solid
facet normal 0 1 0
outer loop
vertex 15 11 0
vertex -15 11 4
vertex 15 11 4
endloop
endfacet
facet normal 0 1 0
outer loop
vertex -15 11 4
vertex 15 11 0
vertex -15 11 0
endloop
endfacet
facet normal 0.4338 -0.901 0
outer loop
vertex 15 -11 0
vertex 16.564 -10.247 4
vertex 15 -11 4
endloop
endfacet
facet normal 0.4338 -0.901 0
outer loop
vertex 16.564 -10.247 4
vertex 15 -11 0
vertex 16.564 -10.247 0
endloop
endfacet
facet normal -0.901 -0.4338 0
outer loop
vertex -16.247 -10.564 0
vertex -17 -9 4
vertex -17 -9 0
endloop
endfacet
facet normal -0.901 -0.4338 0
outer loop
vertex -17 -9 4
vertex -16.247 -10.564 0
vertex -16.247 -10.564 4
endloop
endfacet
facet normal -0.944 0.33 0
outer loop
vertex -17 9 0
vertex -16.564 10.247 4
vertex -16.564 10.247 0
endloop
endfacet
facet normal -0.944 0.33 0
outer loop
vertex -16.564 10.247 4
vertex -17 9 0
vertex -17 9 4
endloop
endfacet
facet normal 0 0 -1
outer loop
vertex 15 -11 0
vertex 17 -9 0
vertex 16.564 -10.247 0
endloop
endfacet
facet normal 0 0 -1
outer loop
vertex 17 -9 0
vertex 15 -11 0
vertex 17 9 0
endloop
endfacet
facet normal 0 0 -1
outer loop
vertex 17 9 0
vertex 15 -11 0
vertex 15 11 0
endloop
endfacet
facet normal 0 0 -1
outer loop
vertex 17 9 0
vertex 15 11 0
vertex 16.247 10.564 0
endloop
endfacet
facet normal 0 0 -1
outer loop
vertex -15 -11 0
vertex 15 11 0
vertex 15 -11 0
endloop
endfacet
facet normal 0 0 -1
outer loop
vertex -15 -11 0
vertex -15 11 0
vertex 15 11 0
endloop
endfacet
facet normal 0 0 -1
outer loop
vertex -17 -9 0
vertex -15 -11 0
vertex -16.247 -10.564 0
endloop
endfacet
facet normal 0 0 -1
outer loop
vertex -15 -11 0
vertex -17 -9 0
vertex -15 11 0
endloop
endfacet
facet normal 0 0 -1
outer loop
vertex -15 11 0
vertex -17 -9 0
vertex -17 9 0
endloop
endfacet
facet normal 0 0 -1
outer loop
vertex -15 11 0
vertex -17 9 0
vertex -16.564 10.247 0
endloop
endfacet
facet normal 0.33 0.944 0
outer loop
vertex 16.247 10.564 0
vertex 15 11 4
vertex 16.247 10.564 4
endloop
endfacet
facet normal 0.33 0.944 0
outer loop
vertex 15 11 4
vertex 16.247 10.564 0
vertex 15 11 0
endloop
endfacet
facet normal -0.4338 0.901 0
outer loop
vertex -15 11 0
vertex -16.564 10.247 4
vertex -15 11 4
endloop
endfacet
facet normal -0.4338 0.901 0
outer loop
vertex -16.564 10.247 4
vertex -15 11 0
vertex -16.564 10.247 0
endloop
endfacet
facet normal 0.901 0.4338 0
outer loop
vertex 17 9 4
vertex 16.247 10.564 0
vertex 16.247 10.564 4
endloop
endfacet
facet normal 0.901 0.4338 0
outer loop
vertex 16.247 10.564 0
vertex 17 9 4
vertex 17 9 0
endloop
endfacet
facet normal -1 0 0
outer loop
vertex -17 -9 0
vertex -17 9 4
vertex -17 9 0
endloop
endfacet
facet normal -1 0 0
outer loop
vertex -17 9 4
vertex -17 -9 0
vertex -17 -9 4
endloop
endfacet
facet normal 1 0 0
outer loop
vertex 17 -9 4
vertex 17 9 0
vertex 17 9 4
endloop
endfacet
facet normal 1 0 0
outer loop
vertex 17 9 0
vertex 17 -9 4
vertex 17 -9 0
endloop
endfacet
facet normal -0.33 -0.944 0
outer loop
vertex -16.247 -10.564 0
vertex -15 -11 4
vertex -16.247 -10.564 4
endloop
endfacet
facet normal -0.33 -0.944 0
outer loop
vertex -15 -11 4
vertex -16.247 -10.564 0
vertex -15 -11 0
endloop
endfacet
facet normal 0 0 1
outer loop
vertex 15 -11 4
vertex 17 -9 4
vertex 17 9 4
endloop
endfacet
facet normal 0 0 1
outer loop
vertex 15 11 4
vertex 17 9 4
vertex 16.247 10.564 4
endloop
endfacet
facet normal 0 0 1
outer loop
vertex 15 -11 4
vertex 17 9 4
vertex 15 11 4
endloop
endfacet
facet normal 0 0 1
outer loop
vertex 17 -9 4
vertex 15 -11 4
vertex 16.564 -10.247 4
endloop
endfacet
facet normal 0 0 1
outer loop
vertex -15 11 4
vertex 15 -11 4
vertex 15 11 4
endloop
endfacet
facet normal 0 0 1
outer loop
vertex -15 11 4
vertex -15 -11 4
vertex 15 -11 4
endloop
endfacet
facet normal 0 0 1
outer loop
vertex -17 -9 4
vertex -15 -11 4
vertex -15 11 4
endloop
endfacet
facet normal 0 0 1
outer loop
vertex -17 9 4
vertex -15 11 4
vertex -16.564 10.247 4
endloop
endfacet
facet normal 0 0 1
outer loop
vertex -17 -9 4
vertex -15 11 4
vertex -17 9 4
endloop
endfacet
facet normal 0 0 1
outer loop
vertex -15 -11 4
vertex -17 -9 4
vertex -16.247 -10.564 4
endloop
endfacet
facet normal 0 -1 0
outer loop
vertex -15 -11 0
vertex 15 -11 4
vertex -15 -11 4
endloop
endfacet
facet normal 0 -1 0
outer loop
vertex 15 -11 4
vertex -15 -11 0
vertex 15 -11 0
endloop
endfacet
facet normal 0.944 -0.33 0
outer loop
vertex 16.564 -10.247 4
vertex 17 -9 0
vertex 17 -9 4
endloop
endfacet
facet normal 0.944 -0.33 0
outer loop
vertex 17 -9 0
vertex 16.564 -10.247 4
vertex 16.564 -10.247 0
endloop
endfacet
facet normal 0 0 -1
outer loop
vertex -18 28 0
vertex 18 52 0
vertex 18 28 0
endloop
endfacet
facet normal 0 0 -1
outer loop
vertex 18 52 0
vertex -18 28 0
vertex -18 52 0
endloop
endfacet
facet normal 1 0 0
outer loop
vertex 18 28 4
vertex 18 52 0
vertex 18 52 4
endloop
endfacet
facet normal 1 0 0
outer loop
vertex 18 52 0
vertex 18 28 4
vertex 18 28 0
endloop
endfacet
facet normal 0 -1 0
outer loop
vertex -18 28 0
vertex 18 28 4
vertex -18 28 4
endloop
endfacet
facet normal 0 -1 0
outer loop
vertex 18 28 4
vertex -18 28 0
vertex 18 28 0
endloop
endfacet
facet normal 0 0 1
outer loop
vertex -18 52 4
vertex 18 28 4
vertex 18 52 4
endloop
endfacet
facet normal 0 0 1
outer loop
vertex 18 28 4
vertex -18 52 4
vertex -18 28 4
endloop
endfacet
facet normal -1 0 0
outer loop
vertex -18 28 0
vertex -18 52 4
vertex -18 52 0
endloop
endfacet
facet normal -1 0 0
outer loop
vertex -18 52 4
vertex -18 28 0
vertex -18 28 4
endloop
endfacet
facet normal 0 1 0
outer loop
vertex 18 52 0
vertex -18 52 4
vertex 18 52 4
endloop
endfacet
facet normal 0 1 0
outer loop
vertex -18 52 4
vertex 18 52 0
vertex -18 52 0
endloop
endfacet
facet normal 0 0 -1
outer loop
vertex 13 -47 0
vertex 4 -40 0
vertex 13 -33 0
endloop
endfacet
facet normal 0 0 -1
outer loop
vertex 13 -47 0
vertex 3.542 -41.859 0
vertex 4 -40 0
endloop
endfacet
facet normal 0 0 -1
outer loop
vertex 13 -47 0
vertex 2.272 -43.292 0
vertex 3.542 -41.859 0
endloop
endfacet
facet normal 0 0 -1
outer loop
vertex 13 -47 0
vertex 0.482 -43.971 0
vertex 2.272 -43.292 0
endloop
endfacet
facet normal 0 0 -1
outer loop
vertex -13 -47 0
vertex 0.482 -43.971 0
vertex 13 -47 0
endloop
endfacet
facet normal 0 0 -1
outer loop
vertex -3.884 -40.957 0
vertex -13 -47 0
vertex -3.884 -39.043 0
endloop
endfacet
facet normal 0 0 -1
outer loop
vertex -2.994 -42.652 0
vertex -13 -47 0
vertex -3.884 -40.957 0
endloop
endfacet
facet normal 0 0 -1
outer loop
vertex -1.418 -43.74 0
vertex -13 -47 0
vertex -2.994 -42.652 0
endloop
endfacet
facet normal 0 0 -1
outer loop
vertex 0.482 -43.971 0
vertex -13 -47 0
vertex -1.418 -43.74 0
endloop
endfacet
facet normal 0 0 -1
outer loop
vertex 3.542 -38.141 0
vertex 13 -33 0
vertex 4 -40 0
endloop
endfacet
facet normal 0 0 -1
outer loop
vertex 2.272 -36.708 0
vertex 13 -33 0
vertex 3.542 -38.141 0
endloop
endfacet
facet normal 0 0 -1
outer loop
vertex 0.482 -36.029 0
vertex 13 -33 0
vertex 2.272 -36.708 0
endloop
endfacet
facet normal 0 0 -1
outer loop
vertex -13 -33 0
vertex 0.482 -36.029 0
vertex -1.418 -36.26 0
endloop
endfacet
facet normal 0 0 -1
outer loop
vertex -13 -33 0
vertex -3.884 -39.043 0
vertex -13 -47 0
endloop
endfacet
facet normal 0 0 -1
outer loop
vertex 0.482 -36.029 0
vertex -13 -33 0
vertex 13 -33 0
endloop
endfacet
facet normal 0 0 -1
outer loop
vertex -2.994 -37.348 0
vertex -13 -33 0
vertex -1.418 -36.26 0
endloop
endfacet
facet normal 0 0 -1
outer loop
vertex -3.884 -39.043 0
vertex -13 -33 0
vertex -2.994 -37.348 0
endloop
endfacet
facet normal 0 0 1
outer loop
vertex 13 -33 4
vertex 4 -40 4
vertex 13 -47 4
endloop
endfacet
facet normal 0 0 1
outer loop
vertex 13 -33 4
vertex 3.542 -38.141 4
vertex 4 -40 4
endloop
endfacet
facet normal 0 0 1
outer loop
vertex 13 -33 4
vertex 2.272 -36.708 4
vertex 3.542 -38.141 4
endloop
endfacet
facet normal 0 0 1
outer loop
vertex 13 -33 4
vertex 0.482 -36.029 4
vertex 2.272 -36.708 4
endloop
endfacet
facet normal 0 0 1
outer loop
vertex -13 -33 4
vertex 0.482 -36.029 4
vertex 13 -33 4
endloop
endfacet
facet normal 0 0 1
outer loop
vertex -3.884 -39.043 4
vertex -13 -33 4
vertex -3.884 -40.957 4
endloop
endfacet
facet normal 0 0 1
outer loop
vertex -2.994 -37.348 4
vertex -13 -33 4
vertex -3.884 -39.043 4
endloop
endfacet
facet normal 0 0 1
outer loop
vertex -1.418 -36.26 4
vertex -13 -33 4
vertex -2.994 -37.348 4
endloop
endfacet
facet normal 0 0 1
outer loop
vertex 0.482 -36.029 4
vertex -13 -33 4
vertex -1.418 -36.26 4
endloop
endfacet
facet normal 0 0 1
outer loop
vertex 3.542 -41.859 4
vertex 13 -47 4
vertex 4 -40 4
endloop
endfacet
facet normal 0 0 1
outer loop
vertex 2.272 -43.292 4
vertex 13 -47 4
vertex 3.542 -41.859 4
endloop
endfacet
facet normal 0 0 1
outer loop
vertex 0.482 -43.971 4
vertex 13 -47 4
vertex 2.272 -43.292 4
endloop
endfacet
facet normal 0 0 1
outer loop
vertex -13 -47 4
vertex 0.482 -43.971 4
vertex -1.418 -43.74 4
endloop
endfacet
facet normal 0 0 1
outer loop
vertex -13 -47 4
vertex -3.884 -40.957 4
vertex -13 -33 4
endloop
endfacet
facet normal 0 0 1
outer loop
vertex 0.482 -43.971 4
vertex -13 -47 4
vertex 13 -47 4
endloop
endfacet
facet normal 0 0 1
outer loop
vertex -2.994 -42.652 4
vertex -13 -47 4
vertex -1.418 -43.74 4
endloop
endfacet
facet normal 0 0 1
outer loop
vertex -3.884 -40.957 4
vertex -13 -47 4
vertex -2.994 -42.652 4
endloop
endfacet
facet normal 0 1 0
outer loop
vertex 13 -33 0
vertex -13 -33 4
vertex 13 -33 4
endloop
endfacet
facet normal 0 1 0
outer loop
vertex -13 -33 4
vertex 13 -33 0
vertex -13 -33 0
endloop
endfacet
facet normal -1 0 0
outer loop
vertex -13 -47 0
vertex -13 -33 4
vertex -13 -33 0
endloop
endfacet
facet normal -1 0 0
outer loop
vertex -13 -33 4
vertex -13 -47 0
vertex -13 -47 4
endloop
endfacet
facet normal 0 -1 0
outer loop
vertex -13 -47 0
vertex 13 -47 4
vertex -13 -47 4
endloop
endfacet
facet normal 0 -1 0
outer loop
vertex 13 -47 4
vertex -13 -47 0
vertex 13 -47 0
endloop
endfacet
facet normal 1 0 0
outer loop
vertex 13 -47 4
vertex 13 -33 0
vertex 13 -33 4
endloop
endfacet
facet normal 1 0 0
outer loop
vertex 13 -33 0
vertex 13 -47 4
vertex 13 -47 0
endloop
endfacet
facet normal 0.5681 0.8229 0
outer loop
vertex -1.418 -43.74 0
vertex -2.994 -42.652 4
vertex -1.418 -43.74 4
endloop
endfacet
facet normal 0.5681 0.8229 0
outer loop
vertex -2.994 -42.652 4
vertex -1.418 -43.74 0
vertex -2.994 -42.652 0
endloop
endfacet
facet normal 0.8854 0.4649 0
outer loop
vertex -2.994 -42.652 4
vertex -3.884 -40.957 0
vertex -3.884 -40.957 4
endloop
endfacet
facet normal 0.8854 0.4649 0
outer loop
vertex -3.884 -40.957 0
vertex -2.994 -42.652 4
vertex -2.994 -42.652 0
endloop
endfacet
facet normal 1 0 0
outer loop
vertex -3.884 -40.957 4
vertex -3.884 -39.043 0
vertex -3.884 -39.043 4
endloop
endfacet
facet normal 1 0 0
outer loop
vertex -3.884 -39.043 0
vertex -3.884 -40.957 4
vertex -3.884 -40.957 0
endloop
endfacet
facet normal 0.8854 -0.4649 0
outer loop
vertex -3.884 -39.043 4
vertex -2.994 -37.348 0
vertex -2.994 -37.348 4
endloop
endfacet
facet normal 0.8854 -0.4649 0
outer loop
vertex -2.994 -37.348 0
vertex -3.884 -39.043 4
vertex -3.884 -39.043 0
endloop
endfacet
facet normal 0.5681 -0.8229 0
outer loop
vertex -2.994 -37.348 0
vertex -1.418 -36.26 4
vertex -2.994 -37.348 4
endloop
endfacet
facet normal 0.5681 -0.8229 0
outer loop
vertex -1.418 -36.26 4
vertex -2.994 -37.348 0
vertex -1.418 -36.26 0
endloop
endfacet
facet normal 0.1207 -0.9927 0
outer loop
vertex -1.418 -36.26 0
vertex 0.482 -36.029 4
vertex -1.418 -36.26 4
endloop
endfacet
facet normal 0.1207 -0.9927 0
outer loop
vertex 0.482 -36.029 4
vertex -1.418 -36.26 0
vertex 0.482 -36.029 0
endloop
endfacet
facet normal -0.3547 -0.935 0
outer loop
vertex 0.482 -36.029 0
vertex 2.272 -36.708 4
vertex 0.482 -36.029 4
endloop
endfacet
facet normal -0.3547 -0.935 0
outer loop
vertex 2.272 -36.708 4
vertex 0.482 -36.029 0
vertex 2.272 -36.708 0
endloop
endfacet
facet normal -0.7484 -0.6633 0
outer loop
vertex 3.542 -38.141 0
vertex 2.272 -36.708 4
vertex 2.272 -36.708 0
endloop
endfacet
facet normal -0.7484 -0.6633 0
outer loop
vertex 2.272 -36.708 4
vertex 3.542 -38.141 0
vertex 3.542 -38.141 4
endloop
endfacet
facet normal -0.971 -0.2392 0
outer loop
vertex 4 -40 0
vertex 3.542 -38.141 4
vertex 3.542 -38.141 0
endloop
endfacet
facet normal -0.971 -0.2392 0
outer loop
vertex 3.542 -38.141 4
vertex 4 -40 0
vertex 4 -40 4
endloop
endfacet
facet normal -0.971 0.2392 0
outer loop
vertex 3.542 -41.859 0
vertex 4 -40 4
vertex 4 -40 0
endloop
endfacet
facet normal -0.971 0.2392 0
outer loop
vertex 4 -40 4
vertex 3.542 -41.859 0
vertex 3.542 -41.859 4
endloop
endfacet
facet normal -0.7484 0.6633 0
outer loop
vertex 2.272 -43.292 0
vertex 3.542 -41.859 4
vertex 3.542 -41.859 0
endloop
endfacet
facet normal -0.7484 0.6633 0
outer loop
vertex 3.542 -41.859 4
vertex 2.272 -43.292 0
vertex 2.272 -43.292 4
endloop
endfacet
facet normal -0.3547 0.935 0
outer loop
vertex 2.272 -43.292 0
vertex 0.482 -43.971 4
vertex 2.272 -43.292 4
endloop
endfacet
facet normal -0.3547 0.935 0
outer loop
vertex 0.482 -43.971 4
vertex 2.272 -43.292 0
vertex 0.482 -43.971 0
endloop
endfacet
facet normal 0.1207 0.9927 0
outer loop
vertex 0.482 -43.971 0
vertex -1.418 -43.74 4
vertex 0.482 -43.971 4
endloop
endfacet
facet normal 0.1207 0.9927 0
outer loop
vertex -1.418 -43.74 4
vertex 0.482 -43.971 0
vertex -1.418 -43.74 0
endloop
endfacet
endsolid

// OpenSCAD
// offset: rounded (r) and sharp (delta) corners on a profile with a hole
linear_extrude(4) offset(r = 2) square([30, 18], center = true);
translate([0, 40, 0]) linear_extrude(4) offset(delta = 3) square([30, 18], center = true);
translate([0, -40, 0]) linear_extrude(4) difference() {
    offset(r = -2) square([30, 18], center = true);
    circle(r = 4);
}
